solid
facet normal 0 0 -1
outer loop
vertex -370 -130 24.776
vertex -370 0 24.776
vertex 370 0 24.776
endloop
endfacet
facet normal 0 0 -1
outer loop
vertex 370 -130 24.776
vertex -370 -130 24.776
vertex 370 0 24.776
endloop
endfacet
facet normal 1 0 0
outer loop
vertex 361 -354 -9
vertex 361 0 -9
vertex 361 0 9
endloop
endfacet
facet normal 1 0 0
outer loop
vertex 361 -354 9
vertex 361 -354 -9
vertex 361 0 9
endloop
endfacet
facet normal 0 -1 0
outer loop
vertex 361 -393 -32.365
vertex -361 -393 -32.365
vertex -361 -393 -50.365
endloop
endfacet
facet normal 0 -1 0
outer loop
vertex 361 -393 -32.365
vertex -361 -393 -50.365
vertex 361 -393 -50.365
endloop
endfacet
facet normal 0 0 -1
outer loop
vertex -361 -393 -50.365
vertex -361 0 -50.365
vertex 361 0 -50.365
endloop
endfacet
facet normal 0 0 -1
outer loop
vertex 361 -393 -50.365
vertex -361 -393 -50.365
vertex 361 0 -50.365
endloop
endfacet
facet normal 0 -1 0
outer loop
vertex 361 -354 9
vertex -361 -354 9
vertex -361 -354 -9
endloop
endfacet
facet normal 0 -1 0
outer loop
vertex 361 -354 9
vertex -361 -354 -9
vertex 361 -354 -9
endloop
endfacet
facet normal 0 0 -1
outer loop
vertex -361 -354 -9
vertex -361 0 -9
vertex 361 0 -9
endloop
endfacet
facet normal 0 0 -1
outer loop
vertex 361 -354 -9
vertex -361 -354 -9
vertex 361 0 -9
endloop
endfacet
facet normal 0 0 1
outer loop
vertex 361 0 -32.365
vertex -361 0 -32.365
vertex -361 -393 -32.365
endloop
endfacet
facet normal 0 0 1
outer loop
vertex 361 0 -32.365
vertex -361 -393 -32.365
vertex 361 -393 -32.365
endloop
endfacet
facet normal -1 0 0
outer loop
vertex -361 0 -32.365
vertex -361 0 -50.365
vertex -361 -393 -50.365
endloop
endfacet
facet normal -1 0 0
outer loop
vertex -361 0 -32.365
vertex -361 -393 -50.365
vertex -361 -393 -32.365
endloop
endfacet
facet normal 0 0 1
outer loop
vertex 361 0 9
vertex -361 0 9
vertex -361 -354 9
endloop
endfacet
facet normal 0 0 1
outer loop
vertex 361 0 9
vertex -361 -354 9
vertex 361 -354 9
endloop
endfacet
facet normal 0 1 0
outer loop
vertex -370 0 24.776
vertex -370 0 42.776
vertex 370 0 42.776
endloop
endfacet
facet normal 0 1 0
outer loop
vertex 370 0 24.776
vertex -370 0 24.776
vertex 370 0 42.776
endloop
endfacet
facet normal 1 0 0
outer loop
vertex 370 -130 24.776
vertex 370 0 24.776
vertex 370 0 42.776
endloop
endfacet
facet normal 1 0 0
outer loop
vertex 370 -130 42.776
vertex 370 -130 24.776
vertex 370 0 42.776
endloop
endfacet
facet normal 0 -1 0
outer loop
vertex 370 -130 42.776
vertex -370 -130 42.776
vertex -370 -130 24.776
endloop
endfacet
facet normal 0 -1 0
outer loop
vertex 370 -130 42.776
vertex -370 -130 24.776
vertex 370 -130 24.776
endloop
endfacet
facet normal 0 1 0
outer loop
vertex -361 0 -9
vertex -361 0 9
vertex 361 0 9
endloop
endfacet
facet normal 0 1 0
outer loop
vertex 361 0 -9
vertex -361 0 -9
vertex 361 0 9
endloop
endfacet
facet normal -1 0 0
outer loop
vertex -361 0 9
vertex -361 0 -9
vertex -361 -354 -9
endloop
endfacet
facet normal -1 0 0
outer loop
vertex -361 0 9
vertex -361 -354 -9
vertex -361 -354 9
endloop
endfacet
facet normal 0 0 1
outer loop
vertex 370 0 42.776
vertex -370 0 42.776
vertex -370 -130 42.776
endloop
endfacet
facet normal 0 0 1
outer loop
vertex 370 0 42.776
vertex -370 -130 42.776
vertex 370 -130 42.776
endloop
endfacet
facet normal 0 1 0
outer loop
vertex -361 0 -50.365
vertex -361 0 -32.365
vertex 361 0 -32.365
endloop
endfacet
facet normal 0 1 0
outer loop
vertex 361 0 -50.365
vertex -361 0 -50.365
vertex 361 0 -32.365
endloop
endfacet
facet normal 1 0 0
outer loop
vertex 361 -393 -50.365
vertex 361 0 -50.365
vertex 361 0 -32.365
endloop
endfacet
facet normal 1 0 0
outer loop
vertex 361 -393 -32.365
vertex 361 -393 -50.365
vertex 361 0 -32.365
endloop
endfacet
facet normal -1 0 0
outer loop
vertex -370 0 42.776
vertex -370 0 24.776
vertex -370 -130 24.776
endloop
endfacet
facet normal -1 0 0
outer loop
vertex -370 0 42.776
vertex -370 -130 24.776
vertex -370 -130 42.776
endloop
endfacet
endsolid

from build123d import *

# Parameters (mm, degrees)
F0_W     = 722
F0_H     = 18
F1_DEPTH = 393
F2_DEPTH = 354
F3_W     = 740
F3_H     = 18
F4_DEPTH = 130


with BuildPart() as f1:
    # F0 (on Front) → F1 (new body)
    with BuildSketch(Plane.XZ):
        with Locations((0, -41.365389)):
            Rectangle(F0_W, F0_H)
    extrude(amount=F1_DEPTH)


with BuildPart() as f2:
    # F0 (on Front) → F2 (new body)
    with BuildSketch(Plane.XZ):
        Rectangle(F0_W, F0_H)
    extrude(amount=F2_DEPTH)


with BuildPart() as f4:
    # F3 (on Front) → F4 (new body)
    with BuildSketch(Plane.XZ):
        with Locations((0, 33.776317)):
            Rectangle(F3_W, F3_H)
    extrude(amount=F4_DEPTH)


solid = Compound([f1.part, f2.part, f4.part])
